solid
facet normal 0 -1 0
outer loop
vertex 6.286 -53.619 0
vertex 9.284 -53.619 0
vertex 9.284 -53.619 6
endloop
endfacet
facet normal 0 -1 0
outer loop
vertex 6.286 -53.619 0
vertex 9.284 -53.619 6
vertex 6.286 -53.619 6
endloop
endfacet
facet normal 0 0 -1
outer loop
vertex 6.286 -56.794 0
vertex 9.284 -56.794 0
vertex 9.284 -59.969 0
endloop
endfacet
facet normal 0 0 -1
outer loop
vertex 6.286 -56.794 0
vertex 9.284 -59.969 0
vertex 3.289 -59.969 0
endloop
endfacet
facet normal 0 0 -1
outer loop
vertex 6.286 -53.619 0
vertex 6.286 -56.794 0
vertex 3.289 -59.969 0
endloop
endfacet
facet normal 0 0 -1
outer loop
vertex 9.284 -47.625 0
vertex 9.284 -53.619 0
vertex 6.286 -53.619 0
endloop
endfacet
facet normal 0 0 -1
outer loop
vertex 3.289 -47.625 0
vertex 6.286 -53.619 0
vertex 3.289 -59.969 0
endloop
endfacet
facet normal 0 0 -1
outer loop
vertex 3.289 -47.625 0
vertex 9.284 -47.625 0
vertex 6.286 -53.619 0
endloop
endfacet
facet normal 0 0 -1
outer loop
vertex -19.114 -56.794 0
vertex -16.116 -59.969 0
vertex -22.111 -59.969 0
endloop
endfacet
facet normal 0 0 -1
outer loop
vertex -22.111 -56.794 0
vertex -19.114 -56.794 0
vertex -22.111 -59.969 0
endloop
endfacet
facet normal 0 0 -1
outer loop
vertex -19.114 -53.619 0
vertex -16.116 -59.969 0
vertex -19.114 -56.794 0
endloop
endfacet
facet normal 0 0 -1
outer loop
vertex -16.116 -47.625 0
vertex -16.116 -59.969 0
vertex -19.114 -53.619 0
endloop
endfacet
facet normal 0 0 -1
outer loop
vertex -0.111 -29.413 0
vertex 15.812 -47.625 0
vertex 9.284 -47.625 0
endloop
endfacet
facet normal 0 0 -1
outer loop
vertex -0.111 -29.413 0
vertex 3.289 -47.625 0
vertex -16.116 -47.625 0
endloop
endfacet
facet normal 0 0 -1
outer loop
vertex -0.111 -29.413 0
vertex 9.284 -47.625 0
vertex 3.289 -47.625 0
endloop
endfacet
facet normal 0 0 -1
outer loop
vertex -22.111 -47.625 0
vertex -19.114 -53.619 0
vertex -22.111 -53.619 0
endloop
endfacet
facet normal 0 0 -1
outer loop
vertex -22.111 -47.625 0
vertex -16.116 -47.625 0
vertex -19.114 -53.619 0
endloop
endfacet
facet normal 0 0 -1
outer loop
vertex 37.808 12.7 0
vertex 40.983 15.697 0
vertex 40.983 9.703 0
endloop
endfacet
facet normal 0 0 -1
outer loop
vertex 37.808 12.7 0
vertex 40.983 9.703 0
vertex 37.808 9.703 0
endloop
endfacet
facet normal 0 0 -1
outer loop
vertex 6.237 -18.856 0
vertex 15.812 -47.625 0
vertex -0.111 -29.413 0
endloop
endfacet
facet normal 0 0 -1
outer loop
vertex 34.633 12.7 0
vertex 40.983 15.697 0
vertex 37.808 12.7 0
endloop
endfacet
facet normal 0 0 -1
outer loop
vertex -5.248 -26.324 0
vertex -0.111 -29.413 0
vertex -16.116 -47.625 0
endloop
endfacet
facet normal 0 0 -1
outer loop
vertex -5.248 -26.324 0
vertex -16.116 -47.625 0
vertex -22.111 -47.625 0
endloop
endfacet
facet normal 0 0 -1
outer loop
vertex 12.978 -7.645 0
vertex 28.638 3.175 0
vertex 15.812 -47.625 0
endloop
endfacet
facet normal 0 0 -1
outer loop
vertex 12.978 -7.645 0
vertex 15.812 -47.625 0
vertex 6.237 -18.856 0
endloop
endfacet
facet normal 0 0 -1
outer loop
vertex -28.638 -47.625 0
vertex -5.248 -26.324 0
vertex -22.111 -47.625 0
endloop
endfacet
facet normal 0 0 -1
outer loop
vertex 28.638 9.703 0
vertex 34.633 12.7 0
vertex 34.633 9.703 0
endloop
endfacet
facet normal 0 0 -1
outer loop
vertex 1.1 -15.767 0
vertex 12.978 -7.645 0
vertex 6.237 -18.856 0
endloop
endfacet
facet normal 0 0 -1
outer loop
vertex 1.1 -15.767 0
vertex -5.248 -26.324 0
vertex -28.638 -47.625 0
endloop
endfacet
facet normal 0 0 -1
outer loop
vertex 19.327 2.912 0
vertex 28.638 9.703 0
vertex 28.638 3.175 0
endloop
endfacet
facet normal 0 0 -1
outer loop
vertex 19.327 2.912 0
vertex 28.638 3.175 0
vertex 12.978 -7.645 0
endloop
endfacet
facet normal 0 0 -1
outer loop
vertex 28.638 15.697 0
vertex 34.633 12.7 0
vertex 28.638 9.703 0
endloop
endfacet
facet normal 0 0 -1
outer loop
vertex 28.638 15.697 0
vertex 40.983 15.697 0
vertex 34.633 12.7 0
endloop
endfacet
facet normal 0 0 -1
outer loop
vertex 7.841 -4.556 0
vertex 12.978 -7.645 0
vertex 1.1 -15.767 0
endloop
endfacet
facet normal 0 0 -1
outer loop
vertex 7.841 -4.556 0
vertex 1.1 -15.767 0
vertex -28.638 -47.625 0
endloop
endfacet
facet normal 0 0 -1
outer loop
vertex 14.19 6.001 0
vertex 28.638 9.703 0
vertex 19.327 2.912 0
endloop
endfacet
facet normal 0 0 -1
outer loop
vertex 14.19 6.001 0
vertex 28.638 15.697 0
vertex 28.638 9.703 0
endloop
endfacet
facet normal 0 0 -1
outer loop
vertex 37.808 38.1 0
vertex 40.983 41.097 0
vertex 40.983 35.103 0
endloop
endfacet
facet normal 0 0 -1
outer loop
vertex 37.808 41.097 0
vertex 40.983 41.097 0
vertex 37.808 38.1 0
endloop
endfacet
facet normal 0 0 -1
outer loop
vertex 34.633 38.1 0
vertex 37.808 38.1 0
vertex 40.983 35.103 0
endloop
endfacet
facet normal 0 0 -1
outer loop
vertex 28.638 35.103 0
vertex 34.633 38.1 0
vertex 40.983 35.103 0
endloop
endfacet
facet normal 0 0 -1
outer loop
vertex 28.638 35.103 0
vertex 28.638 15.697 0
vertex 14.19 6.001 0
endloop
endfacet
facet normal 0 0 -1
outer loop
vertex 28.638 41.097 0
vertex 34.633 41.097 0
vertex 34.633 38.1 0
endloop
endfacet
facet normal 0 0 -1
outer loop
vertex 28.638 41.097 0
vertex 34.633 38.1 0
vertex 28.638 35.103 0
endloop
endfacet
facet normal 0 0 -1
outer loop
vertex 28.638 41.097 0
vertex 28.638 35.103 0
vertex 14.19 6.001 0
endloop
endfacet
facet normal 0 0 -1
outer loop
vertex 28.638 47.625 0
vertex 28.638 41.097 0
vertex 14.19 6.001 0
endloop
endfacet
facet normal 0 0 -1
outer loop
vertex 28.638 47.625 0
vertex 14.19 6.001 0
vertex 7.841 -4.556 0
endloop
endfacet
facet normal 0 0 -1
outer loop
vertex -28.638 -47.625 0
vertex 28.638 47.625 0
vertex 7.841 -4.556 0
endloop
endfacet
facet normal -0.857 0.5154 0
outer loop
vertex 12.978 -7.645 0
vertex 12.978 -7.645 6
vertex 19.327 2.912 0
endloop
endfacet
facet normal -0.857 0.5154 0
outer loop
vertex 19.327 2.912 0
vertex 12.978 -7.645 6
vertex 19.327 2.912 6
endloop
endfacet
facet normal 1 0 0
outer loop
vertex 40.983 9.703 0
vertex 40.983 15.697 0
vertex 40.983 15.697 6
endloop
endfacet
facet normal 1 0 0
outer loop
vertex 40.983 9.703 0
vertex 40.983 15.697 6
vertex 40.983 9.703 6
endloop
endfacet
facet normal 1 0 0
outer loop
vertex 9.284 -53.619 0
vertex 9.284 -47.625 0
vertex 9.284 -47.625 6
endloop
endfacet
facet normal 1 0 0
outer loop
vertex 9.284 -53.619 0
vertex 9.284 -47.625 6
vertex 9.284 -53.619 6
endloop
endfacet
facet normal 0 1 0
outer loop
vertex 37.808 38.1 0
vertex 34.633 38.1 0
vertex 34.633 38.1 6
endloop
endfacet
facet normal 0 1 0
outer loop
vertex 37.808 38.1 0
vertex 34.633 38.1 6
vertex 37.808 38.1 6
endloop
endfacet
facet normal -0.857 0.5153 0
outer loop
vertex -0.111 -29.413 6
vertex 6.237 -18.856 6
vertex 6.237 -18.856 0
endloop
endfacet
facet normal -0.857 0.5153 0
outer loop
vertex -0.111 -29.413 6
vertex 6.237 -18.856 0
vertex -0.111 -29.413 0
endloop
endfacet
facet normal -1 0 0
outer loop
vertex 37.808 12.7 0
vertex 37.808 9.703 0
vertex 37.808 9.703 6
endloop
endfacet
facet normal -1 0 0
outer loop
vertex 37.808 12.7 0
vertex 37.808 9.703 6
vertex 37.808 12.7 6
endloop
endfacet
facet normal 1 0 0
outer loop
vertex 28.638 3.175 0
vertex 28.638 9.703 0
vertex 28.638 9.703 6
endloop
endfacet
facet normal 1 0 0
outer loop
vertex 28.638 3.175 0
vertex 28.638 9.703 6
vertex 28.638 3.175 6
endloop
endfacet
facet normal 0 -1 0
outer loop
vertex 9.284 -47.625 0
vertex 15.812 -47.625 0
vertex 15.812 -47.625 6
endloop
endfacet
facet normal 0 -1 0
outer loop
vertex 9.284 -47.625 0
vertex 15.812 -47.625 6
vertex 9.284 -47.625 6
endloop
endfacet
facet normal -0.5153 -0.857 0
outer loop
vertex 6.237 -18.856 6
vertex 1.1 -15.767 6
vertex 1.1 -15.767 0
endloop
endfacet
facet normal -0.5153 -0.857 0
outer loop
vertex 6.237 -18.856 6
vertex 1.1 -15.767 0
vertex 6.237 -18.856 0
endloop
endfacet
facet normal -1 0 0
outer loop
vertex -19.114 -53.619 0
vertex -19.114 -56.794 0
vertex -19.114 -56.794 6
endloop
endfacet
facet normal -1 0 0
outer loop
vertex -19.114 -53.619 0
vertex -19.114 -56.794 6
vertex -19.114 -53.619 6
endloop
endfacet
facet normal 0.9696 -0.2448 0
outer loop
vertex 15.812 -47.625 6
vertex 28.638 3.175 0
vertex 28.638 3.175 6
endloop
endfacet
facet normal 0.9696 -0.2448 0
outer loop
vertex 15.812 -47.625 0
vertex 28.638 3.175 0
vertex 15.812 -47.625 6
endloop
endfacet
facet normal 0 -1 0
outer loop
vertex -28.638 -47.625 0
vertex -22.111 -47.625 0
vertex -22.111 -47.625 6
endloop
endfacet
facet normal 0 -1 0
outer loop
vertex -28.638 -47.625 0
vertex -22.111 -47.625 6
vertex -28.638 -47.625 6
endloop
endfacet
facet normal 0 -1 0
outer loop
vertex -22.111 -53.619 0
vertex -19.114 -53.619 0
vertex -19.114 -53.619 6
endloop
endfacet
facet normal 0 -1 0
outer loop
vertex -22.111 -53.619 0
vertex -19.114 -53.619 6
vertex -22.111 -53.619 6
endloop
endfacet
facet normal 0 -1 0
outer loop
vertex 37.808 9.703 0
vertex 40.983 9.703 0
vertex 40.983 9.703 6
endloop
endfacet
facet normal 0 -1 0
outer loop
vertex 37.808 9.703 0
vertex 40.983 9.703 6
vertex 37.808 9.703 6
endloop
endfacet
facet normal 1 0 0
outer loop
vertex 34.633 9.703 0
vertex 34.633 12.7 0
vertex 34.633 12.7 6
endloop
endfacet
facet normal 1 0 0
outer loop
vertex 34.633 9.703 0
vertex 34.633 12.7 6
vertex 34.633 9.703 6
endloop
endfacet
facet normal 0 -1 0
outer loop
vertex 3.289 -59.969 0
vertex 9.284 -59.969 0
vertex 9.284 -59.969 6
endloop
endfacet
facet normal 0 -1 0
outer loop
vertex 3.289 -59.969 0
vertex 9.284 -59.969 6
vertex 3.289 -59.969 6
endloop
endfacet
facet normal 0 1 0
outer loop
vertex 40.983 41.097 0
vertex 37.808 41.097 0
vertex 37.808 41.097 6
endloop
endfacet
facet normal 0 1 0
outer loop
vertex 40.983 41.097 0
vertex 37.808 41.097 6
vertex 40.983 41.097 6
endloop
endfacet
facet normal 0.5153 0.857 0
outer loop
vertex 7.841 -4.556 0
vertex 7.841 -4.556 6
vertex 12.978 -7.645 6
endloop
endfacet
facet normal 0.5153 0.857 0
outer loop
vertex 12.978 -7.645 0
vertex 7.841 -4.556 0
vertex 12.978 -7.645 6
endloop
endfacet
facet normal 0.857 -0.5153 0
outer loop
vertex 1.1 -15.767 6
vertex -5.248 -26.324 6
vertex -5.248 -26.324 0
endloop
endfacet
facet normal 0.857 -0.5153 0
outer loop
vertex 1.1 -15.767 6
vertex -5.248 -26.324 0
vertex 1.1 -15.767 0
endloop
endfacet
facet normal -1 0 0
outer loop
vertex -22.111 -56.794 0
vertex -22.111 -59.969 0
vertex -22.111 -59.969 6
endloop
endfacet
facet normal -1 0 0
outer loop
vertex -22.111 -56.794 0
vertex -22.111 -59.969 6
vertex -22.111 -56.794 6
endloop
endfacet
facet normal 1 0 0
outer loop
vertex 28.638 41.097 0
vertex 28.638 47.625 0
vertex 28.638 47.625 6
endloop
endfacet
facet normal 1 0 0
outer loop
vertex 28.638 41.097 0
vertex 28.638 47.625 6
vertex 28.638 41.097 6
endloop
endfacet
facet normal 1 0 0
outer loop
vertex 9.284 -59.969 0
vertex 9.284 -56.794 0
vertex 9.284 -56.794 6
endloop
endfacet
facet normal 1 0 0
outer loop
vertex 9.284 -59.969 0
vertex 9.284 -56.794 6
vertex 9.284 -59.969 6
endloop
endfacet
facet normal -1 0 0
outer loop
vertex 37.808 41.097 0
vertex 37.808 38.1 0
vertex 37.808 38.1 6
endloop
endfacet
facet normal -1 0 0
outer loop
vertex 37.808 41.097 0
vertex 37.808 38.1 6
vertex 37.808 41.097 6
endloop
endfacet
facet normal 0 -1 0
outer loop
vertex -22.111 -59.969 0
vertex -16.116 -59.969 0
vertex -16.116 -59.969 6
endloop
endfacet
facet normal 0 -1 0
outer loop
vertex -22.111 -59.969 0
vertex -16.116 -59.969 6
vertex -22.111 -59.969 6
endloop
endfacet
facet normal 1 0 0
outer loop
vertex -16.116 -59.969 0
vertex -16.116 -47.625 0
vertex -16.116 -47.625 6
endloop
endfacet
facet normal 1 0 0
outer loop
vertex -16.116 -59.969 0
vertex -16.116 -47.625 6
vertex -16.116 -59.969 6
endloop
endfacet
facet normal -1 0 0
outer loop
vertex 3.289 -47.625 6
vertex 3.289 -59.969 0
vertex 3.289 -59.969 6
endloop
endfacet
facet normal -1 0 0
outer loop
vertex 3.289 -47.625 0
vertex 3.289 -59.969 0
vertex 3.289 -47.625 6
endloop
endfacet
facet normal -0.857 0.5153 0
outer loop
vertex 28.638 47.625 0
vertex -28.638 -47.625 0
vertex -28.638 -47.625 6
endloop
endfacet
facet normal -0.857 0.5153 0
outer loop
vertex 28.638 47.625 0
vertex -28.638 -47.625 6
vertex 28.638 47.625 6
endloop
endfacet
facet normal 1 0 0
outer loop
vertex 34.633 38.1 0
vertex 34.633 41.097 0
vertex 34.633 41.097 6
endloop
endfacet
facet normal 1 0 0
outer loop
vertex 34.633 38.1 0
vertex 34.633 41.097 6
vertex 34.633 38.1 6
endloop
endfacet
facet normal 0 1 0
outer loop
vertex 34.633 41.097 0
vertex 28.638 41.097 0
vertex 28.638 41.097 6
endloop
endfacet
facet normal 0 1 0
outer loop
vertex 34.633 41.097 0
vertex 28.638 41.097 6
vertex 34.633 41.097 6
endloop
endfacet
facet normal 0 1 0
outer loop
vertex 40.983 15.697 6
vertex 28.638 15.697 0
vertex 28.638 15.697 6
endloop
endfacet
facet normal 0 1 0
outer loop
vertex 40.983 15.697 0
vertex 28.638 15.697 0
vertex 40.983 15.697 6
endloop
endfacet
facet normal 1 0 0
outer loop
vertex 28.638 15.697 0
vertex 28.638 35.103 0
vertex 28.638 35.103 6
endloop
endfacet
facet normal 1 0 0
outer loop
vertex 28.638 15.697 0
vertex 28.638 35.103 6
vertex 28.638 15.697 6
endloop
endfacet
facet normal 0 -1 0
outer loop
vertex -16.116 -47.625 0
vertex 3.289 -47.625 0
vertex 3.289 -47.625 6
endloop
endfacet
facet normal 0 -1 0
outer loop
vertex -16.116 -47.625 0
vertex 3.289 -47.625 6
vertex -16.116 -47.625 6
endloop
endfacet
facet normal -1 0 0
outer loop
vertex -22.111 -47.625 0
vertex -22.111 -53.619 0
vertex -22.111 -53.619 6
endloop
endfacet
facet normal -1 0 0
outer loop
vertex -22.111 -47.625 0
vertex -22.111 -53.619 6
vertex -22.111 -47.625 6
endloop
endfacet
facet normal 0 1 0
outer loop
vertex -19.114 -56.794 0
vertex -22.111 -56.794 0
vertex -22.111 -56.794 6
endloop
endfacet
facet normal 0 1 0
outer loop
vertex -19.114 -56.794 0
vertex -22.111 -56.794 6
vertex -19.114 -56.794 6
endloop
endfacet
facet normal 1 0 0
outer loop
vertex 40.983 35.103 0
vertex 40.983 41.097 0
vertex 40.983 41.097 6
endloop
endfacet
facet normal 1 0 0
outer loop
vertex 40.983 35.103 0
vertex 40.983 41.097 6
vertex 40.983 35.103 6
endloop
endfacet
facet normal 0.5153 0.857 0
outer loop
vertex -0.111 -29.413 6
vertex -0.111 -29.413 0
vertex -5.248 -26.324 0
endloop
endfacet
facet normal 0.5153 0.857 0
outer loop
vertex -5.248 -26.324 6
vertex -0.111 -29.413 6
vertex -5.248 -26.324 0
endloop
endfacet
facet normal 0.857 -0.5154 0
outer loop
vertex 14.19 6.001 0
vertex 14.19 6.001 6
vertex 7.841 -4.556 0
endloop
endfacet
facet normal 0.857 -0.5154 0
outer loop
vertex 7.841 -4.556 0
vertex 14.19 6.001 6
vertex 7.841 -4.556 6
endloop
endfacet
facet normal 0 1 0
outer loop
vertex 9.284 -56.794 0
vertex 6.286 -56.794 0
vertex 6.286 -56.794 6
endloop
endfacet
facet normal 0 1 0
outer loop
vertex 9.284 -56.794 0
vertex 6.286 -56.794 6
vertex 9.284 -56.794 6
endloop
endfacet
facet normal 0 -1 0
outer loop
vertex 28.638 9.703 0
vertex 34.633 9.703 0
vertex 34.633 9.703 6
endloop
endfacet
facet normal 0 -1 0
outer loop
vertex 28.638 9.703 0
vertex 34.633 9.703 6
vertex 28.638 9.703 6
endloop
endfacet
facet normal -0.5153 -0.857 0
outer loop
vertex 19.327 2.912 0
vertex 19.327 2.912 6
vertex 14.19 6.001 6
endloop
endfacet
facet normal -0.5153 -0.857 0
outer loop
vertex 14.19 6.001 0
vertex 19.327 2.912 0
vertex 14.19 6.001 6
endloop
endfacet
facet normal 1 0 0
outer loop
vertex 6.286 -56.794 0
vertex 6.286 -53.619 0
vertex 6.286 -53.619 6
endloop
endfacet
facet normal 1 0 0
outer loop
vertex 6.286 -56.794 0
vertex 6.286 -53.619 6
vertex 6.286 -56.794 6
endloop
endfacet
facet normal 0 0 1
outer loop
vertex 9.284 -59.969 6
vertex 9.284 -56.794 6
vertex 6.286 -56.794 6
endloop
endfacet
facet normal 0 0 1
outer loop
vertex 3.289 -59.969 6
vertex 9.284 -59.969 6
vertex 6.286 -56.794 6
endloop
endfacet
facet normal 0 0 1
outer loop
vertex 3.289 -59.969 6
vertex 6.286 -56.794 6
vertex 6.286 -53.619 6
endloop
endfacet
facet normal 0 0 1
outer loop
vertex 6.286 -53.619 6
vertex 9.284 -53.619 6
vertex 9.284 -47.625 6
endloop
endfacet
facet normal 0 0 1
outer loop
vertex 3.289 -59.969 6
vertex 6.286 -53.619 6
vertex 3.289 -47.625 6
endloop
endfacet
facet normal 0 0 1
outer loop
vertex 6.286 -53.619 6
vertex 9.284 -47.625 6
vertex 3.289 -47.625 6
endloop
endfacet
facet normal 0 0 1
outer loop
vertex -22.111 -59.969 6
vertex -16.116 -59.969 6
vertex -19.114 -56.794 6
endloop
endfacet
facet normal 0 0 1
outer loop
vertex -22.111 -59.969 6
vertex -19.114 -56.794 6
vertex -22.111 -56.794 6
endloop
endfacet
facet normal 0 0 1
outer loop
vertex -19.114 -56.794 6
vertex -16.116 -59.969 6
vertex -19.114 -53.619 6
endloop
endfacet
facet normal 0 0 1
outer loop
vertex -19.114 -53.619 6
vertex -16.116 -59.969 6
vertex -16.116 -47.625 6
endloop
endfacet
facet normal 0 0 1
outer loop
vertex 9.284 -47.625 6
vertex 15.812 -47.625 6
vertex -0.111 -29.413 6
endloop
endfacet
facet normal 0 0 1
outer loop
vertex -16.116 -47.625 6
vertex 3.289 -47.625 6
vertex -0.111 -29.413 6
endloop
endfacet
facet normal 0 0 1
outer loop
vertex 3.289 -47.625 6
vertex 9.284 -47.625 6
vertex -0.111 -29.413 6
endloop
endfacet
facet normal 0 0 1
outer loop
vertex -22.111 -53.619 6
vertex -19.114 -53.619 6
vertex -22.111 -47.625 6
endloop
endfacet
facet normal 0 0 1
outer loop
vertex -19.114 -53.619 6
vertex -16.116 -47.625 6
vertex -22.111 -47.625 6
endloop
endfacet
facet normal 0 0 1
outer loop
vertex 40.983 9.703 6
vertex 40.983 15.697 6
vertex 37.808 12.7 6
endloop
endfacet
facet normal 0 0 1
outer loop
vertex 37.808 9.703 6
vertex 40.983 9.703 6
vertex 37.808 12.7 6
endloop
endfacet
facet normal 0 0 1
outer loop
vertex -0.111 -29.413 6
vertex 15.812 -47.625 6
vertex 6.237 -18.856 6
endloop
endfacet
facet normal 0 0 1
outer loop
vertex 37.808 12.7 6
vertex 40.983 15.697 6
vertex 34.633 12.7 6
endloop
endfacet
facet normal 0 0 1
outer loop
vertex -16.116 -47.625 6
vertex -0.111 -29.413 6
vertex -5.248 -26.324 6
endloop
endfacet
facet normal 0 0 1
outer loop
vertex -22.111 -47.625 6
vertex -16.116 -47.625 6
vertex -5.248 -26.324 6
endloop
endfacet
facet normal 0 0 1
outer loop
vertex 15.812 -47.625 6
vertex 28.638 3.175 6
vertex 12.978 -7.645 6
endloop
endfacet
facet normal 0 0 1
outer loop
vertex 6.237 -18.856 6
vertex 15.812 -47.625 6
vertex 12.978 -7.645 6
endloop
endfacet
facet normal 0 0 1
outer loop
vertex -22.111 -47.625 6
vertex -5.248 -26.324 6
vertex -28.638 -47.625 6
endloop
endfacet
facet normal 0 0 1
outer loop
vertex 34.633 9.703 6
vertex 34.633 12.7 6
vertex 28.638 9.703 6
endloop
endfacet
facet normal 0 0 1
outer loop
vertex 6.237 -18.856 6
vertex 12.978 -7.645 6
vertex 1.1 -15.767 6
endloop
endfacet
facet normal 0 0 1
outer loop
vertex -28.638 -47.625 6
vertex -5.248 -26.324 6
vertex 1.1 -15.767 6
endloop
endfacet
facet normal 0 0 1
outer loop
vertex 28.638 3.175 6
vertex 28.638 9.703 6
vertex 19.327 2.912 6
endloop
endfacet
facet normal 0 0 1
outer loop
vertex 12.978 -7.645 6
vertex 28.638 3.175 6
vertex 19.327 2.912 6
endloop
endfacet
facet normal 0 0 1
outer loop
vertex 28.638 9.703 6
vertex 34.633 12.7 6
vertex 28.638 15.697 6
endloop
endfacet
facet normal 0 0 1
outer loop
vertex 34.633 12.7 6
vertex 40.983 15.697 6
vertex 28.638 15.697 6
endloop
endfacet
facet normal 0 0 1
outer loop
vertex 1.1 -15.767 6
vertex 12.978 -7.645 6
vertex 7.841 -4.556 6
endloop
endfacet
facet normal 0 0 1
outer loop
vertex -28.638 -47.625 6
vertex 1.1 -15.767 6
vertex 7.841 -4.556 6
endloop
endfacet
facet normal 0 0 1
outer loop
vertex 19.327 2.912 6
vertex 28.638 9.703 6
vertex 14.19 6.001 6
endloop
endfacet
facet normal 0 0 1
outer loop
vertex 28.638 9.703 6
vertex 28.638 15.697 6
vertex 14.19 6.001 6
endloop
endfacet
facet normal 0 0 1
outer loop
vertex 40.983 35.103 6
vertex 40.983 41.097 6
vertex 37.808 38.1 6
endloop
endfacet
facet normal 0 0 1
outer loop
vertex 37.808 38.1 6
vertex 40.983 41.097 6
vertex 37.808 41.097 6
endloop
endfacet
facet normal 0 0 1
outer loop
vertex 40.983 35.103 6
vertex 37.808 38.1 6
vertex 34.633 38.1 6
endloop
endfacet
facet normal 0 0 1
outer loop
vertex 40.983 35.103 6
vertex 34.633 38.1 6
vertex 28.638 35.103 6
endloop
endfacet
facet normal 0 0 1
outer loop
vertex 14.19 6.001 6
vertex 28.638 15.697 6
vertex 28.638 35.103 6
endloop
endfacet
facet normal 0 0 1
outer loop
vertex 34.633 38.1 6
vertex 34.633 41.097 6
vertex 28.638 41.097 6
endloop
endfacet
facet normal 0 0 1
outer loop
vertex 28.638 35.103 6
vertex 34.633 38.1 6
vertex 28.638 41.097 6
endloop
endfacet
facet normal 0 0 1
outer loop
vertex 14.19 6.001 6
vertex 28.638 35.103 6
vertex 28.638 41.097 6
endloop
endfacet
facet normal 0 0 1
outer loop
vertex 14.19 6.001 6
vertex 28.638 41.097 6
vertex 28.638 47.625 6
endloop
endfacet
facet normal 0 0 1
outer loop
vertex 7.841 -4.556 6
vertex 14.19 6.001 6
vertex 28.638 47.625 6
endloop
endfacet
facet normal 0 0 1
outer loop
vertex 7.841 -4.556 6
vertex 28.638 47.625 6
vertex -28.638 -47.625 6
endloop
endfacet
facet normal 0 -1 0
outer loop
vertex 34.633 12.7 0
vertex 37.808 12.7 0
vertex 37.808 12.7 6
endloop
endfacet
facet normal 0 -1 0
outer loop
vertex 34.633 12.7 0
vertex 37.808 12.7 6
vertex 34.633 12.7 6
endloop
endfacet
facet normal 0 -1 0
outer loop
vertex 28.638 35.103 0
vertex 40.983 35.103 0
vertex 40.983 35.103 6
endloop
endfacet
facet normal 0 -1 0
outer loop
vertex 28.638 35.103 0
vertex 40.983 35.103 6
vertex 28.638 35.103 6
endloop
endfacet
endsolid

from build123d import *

# Parameters (mm, degrees)
BOSS_EXTRUDE1_DEPTH = 6
CUT_EXTRUDE1_DEPTH  = 73.882968029


with BuildPart() as part:
    # Sketch1 → Boss-Extrude1 (new body)
    with BuildSketch(Plane.XY):
        Polygon((28.6385, 47.625), (28.6385, 41.0972), (34.6329, 41.0972), (34.6329, 38.1), (37.8079, 38.1), (37.8079, 41.0972), (40.9829, 41.0972), (40.9829, 35.1028), (28.6385, 35.1028), (28.6385, 15.6972), (40.9829, 15.6972), (40.9829, 9.7028), (37.8079, 9.7028), (37.8079, 12.7), (34.6329, 12.7), (34.6329, 9.7028), (28.6385, 9.7028), (28.6385, 3.175), (15.8115, -47.625), (9.2837, -47.625), (9.2837, -53.6194), (6.2865, -53.6194), (6.2865, -56.7944), (9.2837, -56.7944), (9.2837, -59.9694), (3.2893, -59.9694), (3.2893, -47.625), (-16.1163, -47.625), (-16.1163, -59.9694), (-22.1107, -59.9694), (-22.1107, -56.7944), (-19.1135, -56.7944), (-19.1135, -53.6194), (-22.1107, -53.6194), (-22.1107, -47.625), (-28.6385, -47.625), align=None)
    extrude(amount=BOSS_EXTRUDE1_DEPTH)

    # Sketch2 → Cut-Extrude1 (cut, through all)
    with BuildSketch(Plane.XY.offset(6)):
        Polygon((14.189592964, 6.000975012), (7.84117256, -4.556265128), (12.978303844, -7.645393407), (19.326724249, 2.911846732), align=None)
        Polygon((1.100066357, -15.766530432), (6.237197642, -18.855658711), (-0.111222762, -29.412898851), (-5.248354047, -26.323770571), align=None)
    extrude(amount=-CUT_EXTRUDE1_DEPTH, mode=Mode.SUBTRACT)


solid = part.part
